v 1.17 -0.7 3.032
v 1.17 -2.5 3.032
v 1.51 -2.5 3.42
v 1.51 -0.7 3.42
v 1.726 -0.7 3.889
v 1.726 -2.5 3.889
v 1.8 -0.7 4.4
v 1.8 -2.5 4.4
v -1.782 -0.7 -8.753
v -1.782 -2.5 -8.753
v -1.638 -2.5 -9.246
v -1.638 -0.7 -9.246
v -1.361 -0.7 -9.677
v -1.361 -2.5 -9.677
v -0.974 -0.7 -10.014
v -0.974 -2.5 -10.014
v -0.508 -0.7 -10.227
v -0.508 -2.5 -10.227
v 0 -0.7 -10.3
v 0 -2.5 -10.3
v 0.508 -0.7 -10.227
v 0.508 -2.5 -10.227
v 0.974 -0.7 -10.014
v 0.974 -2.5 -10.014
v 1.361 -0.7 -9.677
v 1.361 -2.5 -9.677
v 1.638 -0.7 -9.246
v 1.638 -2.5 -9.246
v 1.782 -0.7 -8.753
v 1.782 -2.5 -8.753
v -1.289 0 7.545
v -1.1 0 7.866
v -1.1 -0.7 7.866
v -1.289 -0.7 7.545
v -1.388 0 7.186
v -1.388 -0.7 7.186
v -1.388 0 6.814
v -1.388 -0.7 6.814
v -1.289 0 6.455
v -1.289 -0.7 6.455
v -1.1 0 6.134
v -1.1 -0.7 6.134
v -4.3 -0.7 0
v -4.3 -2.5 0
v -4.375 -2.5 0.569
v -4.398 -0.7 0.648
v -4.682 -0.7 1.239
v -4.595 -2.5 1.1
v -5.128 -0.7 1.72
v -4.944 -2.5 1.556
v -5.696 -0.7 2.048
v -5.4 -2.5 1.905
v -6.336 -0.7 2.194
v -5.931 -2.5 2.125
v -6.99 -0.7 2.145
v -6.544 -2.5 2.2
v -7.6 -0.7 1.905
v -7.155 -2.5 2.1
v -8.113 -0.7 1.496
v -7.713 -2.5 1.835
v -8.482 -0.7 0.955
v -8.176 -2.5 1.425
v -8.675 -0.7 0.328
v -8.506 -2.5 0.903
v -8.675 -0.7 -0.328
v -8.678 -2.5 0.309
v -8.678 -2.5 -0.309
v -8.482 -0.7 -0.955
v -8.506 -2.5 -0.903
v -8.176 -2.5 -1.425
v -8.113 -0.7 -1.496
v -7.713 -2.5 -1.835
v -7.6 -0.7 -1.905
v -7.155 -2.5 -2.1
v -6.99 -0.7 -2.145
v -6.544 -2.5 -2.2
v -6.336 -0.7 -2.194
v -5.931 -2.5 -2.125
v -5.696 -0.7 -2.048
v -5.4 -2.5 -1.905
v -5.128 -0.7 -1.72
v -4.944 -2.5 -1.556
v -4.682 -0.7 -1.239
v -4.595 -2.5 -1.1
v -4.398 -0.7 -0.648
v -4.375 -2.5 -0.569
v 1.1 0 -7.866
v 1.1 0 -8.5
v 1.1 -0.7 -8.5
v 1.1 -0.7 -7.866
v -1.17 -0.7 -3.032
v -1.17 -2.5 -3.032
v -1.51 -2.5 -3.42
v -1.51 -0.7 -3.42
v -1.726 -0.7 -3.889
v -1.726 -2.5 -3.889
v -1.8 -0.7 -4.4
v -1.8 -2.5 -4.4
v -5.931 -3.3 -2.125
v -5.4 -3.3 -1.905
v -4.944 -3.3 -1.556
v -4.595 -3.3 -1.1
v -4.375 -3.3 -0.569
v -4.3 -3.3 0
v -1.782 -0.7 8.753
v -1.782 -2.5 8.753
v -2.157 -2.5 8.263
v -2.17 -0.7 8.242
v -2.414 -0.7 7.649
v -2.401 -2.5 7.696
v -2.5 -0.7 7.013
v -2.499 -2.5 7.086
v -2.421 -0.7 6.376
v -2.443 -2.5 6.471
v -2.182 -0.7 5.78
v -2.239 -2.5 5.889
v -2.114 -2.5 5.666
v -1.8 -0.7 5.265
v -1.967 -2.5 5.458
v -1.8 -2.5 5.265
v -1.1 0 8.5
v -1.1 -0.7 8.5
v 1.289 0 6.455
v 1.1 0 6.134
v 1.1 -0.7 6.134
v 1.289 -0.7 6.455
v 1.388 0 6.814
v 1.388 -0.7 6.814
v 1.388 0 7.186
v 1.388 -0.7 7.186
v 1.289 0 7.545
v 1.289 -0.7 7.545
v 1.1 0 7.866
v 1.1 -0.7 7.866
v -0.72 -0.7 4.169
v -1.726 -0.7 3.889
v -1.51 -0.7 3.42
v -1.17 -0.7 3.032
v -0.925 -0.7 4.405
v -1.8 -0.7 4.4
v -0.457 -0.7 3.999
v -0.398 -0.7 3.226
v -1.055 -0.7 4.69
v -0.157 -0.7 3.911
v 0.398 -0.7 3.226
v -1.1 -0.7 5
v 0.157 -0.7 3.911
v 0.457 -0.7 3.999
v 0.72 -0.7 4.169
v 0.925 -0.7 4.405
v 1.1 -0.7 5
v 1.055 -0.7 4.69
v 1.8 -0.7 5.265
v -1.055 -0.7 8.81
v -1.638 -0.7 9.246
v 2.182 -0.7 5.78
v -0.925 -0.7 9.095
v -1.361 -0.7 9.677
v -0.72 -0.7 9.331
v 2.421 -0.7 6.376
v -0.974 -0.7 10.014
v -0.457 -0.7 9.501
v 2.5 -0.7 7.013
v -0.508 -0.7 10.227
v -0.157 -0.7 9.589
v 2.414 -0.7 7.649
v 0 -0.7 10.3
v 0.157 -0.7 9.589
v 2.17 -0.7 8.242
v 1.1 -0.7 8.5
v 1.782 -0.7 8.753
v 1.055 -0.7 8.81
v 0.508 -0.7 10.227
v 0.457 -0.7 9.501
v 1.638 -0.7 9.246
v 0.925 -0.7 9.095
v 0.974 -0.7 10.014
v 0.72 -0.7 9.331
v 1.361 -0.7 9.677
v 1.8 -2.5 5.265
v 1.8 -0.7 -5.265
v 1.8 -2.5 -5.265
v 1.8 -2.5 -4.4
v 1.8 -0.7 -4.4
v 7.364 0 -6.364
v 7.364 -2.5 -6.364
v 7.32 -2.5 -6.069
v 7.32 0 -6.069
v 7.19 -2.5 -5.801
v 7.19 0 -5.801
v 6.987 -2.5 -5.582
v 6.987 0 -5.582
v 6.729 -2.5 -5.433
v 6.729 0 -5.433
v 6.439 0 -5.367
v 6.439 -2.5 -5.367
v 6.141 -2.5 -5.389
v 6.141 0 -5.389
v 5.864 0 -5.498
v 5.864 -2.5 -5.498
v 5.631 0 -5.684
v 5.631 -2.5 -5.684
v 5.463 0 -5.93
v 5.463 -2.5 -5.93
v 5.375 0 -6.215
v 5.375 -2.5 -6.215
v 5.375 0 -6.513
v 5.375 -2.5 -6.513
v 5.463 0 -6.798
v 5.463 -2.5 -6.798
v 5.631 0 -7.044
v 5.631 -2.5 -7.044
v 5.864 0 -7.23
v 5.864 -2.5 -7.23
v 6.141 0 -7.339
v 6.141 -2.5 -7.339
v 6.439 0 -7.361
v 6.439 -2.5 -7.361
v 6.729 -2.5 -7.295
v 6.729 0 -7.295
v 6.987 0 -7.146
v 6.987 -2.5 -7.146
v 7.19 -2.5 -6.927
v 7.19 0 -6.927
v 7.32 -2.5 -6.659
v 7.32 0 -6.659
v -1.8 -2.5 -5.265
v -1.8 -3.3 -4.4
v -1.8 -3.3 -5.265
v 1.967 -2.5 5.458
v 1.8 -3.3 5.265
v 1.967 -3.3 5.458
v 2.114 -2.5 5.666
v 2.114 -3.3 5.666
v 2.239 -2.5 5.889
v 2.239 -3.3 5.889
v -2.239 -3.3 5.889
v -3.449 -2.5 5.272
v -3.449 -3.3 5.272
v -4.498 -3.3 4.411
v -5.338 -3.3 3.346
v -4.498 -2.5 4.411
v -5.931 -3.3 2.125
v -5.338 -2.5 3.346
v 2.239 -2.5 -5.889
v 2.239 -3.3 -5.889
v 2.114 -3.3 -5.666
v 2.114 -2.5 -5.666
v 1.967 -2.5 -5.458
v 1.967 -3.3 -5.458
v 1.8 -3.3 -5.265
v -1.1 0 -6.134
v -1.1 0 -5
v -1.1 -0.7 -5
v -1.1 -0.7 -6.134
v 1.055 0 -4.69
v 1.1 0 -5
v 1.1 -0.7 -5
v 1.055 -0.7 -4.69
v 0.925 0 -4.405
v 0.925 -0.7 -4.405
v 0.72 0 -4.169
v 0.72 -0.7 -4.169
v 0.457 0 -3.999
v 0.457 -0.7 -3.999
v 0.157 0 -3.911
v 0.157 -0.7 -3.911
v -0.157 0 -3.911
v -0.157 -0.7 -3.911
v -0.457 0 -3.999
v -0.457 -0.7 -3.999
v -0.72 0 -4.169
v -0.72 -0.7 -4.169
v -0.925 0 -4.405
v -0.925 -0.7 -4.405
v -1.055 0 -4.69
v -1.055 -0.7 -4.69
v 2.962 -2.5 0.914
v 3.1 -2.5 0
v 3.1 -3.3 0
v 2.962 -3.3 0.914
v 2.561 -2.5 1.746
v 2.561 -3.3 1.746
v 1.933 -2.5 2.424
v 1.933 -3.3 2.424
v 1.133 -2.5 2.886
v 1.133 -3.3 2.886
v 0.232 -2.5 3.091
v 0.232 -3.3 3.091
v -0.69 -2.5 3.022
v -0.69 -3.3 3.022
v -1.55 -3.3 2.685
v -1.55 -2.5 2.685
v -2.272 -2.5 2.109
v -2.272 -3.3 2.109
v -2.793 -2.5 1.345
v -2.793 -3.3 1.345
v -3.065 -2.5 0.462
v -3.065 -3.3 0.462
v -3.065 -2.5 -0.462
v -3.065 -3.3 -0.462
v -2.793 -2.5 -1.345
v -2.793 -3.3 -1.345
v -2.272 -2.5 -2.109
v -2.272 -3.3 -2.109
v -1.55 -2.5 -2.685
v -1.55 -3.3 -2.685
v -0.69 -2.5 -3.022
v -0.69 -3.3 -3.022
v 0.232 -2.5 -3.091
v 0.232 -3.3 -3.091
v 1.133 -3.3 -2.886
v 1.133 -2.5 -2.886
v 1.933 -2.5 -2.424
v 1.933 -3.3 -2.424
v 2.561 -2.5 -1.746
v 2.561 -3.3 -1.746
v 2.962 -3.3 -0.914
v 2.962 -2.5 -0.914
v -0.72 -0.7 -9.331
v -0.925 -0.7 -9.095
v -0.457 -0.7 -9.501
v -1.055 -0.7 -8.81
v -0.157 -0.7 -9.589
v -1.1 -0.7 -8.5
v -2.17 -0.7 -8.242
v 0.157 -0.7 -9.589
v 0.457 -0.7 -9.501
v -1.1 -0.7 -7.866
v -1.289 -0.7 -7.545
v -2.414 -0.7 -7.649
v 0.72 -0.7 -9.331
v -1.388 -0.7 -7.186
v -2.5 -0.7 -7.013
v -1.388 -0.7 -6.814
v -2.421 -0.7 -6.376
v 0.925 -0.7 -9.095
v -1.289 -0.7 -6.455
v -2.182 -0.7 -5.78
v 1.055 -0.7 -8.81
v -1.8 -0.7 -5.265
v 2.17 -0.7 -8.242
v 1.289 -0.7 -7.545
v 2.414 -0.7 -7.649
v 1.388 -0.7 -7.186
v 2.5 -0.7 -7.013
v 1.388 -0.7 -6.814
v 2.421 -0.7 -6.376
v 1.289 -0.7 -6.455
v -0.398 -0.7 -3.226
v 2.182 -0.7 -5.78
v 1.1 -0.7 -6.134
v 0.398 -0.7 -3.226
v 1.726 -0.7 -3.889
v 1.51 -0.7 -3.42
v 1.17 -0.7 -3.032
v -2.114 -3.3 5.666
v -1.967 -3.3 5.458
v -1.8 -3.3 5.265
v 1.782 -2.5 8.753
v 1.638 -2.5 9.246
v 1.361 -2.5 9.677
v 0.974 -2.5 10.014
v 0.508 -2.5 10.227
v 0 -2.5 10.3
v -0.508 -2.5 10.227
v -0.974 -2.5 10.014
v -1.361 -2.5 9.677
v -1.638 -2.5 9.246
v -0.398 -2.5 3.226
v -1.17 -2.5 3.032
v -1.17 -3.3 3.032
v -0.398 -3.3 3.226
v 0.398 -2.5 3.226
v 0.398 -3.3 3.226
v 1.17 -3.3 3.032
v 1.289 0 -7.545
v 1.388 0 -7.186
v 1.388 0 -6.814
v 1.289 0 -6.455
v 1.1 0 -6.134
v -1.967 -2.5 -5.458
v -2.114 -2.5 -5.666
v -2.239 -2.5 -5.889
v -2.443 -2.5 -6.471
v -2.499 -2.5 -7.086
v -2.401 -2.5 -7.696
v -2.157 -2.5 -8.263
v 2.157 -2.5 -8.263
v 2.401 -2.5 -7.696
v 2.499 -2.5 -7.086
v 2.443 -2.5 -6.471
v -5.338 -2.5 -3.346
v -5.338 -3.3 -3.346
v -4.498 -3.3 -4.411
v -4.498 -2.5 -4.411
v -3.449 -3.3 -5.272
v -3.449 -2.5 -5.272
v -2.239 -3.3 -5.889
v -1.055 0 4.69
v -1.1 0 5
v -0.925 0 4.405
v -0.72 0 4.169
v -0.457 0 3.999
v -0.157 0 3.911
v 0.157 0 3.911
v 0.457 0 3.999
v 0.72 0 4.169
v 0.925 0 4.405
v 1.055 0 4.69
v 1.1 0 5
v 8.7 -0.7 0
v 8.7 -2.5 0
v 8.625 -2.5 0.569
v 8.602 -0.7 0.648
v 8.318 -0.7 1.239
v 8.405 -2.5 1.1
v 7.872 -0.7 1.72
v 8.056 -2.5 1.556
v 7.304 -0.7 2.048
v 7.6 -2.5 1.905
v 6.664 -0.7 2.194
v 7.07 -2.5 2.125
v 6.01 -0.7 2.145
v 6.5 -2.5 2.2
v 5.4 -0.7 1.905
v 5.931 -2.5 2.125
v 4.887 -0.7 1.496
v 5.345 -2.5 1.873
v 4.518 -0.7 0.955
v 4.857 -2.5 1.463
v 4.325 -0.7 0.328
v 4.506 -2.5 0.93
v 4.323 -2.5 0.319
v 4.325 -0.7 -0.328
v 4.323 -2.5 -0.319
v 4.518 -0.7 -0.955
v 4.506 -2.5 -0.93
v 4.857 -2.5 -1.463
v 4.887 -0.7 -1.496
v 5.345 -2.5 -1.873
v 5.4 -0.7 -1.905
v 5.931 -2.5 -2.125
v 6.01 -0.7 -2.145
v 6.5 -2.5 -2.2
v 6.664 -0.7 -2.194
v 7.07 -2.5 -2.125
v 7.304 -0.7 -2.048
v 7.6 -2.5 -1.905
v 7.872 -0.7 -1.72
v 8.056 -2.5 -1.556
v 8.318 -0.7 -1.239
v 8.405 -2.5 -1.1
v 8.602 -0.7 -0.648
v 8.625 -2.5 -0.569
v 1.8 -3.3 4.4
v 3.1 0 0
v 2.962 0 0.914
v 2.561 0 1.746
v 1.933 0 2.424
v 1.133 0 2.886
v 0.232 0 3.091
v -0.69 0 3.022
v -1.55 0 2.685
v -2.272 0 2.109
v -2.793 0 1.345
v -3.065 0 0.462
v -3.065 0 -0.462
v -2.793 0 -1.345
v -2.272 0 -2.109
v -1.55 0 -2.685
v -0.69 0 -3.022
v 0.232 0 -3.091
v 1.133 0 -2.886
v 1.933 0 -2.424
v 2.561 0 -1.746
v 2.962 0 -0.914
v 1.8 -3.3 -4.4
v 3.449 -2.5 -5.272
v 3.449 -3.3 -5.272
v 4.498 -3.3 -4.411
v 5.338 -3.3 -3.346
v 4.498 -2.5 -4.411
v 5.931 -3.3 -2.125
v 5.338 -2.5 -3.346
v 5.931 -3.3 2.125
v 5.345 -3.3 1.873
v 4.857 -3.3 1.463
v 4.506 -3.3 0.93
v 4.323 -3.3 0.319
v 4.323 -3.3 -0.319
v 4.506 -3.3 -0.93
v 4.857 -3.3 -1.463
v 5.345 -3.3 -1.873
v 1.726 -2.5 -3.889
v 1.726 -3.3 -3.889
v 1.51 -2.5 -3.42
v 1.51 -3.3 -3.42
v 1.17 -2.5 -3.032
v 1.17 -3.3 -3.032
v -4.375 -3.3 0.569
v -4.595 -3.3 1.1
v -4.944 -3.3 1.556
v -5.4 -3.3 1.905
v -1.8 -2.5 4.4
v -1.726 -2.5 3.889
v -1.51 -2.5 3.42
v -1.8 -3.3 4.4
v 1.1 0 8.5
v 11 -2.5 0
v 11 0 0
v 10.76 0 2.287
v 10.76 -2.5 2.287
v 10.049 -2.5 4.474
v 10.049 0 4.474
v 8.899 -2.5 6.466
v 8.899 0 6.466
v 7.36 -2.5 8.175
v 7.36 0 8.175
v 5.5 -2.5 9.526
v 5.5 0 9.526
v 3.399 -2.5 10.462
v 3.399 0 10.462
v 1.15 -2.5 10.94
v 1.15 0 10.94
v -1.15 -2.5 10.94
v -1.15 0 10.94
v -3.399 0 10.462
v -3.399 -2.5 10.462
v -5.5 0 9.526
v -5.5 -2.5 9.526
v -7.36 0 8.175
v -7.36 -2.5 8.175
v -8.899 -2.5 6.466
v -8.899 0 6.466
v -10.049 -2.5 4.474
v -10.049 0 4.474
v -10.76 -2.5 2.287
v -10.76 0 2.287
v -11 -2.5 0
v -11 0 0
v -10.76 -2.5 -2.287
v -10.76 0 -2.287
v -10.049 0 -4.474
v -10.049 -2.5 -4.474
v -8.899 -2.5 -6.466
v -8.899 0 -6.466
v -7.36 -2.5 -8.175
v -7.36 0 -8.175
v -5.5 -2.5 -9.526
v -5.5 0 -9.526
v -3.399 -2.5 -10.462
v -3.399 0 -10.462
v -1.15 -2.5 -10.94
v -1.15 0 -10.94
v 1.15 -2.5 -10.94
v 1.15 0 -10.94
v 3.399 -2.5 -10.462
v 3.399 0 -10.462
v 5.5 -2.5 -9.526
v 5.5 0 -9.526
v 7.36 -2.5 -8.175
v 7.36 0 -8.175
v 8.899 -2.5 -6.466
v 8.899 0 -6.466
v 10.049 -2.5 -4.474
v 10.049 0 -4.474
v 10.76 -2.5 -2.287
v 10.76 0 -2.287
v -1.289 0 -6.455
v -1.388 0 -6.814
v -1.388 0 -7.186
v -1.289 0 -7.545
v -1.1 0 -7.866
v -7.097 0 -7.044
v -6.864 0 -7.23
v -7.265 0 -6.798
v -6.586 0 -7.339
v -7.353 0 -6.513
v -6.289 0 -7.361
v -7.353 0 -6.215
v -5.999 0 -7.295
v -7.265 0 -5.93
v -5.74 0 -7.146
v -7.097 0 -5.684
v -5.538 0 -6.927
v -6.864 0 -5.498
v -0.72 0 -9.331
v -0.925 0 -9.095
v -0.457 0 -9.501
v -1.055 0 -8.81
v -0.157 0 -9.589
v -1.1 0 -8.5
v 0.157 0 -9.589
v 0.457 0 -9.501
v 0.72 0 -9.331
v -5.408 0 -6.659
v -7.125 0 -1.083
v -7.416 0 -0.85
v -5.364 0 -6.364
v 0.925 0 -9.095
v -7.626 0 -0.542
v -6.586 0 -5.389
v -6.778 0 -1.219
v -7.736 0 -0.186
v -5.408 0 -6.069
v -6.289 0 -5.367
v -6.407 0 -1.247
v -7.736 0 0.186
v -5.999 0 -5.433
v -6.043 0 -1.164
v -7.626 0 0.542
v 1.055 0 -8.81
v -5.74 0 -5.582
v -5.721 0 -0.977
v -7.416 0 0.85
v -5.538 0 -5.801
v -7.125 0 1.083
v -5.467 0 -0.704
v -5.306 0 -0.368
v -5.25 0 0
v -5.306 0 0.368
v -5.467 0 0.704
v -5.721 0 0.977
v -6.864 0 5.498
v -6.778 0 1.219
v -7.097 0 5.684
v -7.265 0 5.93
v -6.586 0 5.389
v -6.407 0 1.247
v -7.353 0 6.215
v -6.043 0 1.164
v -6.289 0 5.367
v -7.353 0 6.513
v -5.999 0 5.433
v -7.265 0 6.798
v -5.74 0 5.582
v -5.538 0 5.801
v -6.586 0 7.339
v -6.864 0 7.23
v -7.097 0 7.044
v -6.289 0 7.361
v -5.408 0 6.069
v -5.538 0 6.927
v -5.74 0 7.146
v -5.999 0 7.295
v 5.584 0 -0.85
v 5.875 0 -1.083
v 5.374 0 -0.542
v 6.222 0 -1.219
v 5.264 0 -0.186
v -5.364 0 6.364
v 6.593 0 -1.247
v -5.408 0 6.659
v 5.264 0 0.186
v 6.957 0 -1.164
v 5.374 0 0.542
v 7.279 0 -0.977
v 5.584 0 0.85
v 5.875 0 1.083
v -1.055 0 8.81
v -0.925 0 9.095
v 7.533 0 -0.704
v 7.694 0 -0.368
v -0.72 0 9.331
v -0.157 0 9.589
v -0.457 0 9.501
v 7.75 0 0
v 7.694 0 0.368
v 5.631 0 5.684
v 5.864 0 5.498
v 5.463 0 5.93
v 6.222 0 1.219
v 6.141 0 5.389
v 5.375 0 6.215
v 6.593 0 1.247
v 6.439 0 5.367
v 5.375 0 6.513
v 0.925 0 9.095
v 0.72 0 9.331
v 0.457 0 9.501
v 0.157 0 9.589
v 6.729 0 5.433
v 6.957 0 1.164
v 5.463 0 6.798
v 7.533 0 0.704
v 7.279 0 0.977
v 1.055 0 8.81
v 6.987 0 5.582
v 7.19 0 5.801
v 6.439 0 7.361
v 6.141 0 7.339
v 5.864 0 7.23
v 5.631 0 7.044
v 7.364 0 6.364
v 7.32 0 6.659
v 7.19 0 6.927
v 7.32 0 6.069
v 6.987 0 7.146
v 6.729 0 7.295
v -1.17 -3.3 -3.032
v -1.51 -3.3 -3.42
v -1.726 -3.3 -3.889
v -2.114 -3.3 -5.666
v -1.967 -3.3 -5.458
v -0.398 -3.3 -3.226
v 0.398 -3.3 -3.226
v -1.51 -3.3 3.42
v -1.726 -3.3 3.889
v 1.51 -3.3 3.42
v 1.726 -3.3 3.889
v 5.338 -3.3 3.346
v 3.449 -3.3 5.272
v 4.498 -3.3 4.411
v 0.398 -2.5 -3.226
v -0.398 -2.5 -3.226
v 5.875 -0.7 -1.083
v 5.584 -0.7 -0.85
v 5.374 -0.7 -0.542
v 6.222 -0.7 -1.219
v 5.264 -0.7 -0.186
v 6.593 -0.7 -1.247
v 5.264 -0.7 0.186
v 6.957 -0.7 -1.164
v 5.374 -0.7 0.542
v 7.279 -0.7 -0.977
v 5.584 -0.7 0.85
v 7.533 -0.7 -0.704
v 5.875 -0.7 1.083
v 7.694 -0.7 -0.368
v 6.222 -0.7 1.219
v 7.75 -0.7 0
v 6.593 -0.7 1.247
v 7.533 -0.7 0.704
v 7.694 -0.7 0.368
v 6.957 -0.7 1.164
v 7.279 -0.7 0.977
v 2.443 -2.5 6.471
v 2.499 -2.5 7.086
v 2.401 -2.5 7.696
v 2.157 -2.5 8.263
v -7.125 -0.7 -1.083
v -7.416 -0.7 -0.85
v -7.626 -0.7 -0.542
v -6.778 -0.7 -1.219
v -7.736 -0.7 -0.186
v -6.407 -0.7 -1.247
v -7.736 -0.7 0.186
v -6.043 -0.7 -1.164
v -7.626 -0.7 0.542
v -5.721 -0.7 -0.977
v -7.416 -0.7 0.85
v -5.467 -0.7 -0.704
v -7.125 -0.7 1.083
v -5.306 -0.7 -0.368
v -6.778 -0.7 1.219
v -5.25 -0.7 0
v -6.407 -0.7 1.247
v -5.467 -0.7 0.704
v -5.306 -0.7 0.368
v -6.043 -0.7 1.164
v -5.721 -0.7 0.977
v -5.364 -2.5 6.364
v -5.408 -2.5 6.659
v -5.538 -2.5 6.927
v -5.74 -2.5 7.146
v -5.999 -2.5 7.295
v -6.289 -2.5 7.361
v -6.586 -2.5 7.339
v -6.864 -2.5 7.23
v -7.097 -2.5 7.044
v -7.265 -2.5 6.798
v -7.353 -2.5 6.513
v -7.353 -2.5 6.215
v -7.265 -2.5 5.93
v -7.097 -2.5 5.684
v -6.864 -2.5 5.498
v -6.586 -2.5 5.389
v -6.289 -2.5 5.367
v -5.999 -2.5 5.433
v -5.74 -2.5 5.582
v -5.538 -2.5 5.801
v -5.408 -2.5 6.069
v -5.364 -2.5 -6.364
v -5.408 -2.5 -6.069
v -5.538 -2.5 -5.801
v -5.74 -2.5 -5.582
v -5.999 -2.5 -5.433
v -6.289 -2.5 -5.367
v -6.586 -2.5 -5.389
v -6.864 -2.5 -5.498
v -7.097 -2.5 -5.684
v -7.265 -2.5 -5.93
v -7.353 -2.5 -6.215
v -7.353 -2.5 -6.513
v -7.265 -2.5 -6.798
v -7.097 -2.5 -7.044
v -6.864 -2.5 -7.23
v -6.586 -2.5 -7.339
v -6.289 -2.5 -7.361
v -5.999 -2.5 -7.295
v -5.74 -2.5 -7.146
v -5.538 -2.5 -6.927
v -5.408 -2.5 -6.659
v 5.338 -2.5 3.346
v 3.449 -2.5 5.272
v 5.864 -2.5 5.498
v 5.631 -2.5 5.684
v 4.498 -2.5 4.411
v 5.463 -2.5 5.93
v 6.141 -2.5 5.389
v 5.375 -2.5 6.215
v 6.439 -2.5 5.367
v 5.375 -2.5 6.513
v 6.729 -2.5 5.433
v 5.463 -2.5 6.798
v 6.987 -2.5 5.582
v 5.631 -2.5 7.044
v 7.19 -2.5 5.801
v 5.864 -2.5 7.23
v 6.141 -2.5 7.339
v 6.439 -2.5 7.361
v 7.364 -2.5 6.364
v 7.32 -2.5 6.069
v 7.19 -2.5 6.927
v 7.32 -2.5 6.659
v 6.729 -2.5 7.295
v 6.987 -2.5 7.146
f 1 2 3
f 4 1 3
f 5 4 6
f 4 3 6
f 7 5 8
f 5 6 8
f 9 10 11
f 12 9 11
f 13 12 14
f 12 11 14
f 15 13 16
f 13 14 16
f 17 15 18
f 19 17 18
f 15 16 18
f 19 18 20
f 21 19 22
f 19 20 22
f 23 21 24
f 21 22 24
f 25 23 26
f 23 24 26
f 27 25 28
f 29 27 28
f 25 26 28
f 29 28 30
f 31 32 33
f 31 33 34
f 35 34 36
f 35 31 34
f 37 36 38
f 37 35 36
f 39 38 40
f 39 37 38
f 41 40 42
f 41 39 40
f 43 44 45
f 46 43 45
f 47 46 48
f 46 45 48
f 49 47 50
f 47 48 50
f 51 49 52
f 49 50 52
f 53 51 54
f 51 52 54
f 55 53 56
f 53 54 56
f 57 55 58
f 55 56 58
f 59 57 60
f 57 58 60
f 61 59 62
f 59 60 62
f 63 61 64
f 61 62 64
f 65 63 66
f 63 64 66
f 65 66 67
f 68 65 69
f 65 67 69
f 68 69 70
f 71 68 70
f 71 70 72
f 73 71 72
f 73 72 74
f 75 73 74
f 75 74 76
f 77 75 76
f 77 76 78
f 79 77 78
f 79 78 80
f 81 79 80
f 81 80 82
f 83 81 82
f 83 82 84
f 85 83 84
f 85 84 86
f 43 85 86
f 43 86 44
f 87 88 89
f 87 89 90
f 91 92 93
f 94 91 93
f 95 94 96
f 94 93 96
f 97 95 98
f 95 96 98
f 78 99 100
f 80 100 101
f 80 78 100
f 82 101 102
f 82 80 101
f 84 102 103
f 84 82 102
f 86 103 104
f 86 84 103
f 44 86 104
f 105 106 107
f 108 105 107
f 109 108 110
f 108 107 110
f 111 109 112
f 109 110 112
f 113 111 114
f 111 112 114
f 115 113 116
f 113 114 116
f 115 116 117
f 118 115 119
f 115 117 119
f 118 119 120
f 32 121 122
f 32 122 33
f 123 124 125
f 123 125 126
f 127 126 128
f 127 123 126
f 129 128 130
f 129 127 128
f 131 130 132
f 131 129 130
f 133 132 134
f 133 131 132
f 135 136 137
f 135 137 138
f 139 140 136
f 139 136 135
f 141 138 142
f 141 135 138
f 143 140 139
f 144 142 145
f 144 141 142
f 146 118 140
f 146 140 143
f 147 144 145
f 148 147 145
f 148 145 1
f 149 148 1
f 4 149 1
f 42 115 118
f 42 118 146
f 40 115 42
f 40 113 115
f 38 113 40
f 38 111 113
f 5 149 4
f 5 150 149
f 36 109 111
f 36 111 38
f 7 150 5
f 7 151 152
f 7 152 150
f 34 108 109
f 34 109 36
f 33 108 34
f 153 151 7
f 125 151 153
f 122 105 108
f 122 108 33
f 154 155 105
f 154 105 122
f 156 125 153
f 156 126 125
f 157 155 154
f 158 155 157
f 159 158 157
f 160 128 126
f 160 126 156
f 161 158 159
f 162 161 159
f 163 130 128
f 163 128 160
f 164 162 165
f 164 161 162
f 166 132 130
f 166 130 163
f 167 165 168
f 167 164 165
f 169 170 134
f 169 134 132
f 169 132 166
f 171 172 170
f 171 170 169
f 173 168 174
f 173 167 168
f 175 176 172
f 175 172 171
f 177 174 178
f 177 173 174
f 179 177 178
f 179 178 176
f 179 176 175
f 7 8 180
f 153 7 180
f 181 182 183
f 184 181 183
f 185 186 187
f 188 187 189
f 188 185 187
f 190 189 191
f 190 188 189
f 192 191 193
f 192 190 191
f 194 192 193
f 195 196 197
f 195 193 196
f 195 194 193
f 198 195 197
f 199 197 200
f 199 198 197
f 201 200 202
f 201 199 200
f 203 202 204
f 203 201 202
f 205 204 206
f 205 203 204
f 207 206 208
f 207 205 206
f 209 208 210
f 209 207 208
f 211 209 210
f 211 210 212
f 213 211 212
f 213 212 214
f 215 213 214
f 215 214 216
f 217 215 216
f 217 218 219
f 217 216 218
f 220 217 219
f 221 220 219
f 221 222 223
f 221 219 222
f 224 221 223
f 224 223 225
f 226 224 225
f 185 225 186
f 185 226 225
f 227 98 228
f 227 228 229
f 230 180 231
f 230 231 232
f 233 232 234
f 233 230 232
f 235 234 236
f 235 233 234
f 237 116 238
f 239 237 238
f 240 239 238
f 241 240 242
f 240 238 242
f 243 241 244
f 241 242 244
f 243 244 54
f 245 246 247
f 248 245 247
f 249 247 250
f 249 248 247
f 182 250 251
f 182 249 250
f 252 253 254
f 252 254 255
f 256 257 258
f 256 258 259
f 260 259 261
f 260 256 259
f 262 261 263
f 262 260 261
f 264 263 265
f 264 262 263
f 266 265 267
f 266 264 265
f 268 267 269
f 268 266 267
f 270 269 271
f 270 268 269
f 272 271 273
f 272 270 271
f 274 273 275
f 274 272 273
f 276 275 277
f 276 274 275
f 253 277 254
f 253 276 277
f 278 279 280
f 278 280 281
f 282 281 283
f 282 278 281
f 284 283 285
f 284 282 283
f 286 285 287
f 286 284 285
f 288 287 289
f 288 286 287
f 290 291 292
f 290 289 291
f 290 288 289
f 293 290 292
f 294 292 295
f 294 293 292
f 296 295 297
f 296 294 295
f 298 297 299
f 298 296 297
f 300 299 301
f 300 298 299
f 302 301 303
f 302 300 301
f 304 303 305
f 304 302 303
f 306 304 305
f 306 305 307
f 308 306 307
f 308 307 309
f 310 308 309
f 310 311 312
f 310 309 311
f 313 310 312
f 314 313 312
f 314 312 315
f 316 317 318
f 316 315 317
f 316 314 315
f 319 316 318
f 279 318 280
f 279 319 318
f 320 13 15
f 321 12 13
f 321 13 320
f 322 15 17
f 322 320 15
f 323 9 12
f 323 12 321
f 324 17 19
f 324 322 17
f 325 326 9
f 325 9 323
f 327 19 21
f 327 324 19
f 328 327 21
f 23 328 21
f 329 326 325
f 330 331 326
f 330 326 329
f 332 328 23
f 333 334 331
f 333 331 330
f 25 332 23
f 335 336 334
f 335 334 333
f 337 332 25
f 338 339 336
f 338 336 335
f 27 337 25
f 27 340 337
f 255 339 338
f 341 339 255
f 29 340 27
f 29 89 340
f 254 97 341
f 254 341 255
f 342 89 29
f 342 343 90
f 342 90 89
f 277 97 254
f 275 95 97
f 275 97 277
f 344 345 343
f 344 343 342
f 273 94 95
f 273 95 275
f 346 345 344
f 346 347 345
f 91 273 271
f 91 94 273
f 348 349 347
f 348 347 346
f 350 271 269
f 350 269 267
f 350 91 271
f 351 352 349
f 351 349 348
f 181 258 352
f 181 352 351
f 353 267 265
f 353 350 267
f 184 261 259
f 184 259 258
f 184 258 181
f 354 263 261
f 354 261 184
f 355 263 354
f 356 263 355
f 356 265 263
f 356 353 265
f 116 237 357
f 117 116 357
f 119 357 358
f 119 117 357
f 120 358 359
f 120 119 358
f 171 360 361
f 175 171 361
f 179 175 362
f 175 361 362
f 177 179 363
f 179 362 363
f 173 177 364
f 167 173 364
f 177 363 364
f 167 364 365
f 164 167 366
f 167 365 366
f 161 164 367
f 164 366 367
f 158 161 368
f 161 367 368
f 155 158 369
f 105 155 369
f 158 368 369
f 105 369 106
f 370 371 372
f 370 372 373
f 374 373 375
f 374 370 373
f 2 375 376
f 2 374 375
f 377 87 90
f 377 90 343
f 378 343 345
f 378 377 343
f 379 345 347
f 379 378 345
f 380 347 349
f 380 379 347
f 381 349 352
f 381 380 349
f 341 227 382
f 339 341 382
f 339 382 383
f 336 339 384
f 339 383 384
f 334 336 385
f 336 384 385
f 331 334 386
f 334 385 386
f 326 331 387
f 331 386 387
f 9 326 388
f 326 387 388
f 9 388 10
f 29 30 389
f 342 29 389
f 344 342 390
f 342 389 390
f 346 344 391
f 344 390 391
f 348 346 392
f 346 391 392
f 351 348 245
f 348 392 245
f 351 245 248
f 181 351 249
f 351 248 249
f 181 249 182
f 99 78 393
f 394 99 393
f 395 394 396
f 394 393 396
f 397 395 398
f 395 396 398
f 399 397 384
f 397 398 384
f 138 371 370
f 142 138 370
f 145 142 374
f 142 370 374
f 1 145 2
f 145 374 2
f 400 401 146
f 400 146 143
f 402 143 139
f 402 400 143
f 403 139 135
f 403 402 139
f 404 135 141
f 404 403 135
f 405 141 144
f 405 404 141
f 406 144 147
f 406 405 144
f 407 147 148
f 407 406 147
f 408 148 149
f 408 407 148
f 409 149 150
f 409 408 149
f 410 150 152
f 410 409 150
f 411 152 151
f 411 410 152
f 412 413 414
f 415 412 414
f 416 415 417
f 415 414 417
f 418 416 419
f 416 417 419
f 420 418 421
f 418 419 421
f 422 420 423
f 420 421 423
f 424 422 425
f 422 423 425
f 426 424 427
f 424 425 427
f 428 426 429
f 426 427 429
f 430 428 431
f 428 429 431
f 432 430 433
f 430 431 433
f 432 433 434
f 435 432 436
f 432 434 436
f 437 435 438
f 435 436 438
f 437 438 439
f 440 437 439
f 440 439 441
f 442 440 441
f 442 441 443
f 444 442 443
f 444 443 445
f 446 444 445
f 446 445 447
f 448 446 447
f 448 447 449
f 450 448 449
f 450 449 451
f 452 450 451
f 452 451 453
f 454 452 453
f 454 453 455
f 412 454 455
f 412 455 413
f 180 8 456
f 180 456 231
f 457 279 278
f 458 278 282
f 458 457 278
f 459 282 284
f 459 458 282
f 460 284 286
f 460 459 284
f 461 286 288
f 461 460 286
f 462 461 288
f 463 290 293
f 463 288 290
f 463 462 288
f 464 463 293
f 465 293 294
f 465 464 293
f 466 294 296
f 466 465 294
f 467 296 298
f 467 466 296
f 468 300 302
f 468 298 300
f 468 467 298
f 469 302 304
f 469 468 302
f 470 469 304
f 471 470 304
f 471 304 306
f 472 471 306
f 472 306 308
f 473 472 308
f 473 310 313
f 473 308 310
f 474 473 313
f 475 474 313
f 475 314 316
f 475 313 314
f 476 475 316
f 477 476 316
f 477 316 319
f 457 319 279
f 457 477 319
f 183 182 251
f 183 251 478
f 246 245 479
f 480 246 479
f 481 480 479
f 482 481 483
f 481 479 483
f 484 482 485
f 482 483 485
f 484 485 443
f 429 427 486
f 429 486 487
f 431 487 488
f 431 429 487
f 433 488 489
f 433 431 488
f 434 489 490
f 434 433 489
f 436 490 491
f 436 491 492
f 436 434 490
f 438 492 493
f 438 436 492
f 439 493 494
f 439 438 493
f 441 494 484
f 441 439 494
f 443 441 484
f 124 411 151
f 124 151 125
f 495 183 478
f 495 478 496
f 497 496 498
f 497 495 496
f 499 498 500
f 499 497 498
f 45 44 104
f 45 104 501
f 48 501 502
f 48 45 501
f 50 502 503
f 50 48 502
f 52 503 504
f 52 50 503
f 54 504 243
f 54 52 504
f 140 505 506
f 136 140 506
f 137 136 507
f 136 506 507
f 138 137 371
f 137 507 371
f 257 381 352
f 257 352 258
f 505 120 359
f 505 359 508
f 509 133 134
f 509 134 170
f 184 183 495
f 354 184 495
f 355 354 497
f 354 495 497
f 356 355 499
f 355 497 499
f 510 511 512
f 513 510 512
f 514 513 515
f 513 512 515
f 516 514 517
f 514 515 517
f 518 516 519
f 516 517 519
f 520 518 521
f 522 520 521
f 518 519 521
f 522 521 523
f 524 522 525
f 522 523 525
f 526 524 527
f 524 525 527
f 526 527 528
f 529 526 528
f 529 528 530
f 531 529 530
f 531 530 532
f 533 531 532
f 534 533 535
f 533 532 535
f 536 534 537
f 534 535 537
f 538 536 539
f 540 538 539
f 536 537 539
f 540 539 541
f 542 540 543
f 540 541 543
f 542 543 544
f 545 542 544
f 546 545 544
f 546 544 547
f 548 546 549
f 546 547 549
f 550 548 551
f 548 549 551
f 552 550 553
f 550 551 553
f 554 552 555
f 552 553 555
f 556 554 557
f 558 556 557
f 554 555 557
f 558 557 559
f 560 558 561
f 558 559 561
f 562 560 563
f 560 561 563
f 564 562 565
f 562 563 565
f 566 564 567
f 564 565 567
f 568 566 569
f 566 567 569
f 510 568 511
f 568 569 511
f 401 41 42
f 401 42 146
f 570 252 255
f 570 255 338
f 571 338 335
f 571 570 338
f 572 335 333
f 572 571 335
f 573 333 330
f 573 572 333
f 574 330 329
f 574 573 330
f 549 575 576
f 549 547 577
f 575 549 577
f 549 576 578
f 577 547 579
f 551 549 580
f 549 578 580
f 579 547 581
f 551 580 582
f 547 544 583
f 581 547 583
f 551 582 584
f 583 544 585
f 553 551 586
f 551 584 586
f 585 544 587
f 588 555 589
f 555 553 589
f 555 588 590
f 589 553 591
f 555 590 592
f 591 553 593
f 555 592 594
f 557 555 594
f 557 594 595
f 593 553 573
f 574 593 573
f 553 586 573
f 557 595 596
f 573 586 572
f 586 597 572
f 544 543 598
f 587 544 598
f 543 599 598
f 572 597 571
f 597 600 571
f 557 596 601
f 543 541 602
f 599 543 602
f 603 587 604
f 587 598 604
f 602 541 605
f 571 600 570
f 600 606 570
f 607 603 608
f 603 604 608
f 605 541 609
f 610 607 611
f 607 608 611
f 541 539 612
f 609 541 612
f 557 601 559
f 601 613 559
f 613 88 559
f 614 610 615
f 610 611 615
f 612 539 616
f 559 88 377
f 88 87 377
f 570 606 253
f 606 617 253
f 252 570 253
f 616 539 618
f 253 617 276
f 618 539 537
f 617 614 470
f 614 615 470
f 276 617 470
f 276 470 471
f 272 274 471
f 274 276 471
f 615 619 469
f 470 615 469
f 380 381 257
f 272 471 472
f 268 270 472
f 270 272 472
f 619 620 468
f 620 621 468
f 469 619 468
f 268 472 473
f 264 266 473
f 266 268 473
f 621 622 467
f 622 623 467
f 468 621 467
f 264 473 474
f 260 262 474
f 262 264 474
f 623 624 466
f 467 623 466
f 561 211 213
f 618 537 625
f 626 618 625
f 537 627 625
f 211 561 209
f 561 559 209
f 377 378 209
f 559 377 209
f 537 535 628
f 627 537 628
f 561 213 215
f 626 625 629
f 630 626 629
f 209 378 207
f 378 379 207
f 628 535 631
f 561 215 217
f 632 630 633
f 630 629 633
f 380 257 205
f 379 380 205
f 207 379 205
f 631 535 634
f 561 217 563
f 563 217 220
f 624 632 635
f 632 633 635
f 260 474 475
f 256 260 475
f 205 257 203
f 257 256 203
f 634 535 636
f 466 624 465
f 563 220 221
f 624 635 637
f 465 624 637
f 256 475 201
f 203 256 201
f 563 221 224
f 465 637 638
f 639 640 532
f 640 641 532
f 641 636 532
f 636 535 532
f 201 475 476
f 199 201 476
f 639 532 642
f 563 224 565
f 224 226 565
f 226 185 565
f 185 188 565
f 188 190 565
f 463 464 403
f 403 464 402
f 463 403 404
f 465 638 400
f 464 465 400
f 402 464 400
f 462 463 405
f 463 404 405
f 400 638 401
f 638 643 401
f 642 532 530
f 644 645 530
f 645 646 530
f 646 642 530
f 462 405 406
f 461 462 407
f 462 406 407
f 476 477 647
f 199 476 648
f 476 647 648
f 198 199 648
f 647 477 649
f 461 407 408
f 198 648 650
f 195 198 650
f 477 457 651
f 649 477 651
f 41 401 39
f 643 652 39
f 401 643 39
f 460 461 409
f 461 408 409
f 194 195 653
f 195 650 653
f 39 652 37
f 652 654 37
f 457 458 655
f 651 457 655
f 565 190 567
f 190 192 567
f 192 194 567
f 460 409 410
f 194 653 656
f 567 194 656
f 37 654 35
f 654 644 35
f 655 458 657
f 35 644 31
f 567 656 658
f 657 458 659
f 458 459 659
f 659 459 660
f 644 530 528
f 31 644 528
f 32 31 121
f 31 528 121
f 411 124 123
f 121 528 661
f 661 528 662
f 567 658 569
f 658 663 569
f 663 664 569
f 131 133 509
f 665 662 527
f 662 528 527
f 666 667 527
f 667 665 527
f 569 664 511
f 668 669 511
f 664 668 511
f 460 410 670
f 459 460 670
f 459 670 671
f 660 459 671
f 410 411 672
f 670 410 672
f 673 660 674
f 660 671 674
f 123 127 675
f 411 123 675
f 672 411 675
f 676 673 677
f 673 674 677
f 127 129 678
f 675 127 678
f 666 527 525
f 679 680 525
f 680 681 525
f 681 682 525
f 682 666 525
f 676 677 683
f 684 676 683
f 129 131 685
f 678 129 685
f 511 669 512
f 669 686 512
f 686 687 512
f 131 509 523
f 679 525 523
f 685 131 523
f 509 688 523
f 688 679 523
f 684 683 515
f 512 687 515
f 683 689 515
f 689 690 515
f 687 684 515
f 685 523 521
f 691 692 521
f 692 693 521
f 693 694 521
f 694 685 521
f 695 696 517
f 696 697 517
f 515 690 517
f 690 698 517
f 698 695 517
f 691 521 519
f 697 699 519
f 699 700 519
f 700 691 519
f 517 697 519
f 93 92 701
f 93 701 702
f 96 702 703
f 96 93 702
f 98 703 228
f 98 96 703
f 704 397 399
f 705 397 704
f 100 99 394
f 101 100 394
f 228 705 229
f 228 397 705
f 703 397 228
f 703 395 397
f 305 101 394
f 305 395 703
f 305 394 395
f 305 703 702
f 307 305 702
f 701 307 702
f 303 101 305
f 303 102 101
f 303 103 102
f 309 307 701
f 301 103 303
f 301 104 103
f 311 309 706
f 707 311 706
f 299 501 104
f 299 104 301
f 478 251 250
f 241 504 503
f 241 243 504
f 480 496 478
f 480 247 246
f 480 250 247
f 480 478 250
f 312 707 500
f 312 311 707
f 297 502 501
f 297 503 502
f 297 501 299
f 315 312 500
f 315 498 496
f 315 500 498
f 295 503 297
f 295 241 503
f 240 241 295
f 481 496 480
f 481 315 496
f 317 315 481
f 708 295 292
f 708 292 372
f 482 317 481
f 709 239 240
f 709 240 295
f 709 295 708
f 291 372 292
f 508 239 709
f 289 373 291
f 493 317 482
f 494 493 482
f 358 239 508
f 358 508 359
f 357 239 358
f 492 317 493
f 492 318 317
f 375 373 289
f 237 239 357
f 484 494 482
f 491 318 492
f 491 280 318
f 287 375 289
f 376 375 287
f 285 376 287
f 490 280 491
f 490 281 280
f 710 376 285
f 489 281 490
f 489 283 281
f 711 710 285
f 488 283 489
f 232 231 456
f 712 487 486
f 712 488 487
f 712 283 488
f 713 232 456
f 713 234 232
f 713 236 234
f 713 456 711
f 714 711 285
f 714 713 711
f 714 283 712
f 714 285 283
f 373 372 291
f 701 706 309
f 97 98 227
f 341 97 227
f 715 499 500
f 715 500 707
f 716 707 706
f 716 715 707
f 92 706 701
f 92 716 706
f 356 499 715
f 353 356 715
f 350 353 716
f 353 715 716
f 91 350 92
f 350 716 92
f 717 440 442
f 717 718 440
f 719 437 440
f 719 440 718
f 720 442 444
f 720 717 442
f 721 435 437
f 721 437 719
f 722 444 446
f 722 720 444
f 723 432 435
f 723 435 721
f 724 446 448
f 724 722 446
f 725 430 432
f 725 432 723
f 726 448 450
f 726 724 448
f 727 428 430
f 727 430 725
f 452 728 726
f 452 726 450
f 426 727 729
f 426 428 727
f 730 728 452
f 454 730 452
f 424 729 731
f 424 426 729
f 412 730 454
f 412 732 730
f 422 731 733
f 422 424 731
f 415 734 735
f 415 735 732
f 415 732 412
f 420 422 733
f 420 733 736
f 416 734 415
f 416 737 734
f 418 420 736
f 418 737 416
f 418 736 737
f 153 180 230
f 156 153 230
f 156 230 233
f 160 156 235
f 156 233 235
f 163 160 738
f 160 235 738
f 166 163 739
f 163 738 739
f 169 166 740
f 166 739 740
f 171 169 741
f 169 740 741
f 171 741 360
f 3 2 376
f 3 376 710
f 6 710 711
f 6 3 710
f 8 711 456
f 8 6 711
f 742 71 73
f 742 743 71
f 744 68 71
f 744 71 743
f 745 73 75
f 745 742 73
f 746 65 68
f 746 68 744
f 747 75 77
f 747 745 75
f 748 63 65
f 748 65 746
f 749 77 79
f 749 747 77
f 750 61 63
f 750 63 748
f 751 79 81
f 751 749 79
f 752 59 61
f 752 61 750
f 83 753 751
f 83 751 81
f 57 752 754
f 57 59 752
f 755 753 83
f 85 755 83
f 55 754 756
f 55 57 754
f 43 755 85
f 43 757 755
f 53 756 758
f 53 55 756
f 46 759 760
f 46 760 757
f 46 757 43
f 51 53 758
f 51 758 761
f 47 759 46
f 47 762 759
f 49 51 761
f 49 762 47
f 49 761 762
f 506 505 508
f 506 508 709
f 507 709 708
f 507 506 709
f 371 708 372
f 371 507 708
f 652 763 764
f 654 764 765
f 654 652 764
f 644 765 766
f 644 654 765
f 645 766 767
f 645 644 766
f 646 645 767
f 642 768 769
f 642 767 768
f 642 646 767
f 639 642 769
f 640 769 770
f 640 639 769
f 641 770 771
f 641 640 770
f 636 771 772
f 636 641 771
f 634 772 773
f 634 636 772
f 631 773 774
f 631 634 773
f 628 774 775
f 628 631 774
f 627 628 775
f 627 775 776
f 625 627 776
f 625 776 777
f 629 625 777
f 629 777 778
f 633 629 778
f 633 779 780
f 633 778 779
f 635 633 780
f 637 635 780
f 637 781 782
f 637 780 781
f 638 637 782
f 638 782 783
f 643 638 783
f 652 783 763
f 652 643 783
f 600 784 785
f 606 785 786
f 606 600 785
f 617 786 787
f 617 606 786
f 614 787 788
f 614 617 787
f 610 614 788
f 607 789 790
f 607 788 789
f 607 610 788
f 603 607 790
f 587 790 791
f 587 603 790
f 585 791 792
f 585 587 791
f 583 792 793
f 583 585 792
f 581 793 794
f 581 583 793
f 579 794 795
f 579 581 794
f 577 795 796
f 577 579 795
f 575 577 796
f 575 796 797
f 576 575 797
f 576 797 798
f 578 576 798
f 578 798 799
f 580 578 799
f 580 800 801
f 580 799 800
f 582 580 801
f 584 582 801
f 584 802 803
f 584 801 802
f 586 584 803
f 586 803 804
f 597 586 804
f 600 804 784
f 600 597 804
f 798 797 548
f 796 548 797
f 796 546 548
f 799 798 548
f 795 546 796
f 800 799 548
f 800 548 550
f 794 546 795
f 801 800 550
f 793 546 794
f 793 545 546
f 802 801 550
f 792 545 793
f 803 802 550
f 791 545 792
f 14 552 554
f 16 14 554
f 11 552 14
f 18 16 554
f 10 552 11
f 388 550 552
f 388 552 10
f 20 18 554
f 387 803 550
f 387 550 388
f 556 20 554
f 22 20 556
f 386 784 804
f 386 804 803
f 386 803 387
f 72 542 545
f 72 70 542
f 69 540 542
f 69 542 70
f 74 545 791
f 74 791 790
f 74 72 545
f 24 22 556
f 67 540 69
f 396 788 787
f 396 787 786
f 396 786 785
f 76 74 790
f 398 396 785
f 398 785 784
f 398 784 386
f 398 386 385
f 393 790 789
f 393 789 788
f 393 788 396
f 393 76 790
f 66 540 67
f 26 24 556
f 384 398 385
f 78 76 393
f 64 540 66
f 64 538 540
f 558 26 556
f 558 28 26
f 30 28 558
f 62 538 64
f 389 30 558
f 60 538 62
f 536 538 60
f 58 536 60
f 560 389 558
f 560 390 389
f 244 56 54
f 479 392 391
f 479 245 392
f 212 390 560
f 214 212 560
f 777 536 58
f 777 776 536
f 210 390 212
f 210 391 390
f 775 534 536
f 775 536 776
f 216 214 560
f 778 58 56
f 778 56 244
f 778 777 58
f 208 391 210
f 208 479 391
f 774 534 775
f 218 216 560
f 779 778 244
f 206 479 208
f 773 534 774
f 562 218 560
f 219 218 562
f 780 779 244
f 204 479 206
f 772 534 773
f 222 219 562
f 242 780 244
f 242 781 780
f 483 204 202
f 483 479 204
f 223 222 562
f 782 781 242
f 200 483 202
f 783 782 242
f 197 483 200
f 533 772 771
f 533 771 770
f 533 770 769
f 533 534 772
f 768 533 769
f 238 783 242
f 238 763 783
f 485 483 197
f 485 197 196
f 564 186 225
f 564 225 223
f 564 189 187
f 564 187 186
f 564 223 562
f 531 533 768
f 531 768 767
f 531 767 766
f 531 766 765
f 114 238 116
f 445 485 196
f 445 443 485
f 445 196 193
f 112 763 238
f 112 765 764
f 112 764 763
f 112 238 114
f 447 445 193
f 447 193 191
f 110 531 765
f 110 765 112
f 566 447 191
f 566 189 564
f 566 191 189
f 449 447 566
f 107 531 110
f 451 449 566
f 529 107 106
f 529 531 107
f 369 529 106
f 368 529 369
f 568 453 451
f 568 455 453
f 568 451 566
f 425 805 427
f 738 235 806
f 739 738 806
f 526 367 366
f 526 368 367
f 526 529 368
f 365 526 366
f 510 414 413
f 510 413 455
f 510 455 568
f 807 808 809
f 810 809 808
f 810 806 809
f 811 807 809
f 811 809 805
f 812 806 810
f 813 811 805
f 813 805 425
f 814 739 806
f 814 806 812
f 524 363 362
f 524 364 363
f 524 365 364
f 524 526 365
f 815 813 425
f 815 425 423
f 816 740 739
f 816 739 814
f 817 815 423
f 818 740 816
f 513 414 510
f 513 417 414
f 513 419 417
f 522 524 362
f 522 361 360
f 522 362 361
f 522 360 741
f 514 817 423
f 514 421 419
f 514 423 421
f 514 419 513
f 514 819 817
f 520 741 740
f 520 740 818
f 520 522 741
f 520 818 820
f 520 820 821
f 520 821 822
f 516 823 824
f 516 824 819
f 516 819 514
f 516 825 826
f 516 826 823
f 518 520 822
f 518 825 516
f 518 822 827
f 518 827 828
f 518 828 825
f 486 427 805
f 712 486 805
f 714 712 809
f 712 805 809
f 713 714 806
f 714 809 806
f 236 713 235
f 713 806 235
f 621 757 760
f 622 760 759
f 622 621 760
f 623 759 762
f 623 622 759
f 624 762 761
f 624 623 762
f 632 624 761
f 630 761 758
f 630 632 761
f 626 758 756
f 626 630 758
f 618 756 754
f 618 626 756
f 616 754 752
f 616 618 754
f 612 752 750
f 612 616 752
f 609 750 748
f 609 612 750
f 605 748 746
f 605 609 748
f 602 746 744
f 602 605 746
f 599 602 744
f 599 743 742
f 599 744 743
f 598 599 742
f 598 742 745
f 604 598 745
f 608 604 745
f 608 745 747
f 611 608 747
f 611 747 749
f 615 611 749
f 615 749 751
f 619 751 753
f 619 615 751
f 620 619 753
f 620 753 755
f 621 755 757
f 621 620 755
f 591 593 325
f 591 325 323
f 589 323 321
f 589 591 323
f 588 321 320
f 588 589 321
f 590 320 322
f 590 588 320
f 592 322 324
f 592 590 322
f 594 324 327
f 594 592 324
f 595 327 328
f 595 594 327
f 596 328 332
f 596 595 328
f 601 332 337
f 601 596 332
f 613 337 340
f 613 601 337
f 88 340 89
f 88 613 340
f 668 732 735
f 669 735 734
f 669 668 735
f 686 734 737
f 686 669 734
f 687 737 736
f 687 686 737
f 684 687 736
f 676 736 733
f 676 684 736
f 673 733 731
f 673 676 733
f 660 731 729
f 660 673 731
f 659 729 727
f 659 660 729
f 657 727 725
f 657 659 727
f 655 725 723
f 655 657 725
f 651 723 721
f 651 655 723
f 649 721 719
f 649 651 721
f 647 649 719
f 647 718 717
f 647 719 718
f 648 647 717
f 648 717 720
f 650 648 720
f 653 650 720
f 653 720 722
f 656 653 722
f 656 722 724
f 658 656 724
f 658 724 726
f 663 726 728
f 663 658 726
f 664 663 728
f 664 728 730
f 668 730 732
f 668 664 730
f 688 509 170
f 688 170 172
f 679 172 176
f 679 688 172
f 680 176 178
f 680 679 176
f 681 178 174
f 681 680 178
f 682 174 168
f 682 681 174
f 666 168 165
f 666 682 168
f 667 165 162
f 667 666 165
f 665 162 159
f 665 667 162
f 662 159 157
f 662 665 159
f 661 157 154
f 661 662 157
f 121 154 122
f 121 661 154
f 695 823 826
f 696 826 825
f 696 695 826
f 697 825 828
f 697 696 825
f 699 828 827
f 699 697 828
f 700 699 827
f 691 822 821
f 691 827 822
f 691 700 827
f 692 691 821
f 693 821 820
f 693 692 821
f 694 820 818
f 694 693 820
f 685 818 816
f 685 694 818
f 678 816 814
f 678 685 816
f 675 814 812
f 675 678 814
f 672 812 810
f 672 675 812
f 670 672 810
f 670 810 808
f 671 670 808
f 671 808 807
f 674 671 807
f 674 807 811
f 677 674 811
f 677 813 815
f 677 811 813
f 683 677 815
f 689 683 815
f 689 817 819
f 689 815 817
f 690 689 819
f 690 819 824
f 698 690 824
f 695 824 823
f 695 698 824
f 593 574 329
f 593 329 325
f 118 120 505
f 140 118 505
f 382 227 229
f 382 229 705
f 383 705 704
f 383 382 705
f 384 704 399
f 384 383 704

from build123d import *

# Parameters (mm, degrees)
F0_R     = 11
F2_DEPTH = 2.5
F1_R     = 3.1
F1_R_2   = 1.25
F1_R_3   = 1
F3_DEPTH = 2.501
F4_R     = 2.2
F5_DEPTH = 1.8
F6_R     = 6.3
F7_DEPTH = 0.8
F8_DEPTH = 0.8
F9_DEPTH = 3.301


with BuildPart() as f2:
    # F0 (on Front) → F2 (new body)
    with BuildSketch(Plane.XZ):
        Circle(F0_R)
    extrude(amount=F2_DEPTH)

    # F1 (on Front) → F3 (cut, through all)
    with BuildSketch(Plane.XZ):
        Circle(F1_R)
        with Locations((-6.5, 0)):
            Circle(F1_R_2)
        with Locations((-6.363961, 6.363961)):
            Circle(F1_R_3)
        with Locations((-6.363961, -6.363961)):
            Circle(F1_R_3)
        with Locations((6.363961, -6.363961)):
            Circle(F1_R_3)
        with Locations((6.363961, 6.363961)):
            Circle(F1_R_3)
        with Locations((6.5, 0)):
            Circle(F1_R_2)
        with BuildLine():
            ThreePointArc((1.1, -5), (0, -3.9), (-1.1, -5))
            Line((-1.1, -5), (-1.1, -6.133975))
            ThreePointArc((-1.1, -6.133975), (-1.4, -7), (-1.1, -7.866025))
            Line((-1.1, -7.866025), (-1.1, -8.5))
            ThreePointArc((-1.1, -8.5), (0, -9.6), (1.1, -8.5))
            Line((1.1, -8.5), (1.1, -7.866025))
            ThreePointArc((1.1, -7.866025), (1.4, -7), (1.1, -6.133975))
            Line((1.1, -6.133975), (1.1, -5))
        make_face()
        with BuildLine():
            Line((-1.1, 8.5), (-1.1, 7.866025))
            ThreePointArc((-1.1, 7.866025), (-1.4, 7), (-1.1, 6.133975))
            Line((-1.1, 6.133975), (-1.1, 5))
            ThreePointArc((-1.1, 5), (0, 3.9), (1.1, 5))
            Line((1.1, 5), (1.1, 6.133975))
            ThreePointArc((1.1, 6.133975), (1.4, 7), (1.1, 7.866025))
            Line((1.1, 7.866025), (1.1, 8.5))
            ThreePointArc((1.1, 8.5), (0, 9.6), (-1.1, 8.5))
        make_face()
    extrude(amount=F3_DEPTH, mode=Mode.SUBTRACT)

    # F4 (on face) → F5 (cut)
    with BuildSketch(Plane.XZ.offset(2.5)):
        with Locations((-6.5, 0)):
            Circle(F4_R)
        with Locations((6.5, 0)):
            Circle(F4_R)
        with BuildLine():
            Line((1.8, 4.4), (1.8, 5.265065))
            ThreePointArc((1.8, 5.265065), (2.499967, 7.01284), (1.782084, 8.753333))
            ThreePointArc((1.782084, 8.753333), (0, 10.3), (-1.782084, 8.753333))
            ThreePointArc((-1.782084, 8.753333), (-2.499967, 7.01284), (-1.8, 5.265065))
            Line((-1.8, 5.265065), (-1.8, 4.4))
            ThreePointArc((-1.8, 4.4), (-1.634926, 3.646995), (-1.169981, 3.032102))
            ThreePointArc((-1.169981, 3.032102), (0, 3.25), (1.169981, 3.032102))
            ThreePointArc((1.169981, 3.032102), (1.634926, 3.646995), (1.8, 4.4))
        make_face()
        with BuildLine():
            Line((-1.8, -4.4), (-1.8, -5.265065))
            ThreePointArc((-1.8, -5.265065), (-2.499967, -7.01284), (-1.782084, -8.753333))
            ThreePointArc((-1.782084, -8.753333), (0, -10.3), (1.782084, -8.753333))
            ThreePointArc((1.782084, -8.753333), (2.499967, -7.01284), (1.8, -5.265065))
            Line((1.8, -5.265065), (1.8, -4.4))
            ThreePointArc((1.8, -4.4), (1.634926, -3.646995), (1.169981, -3.032102))
            ThreePointArc((1.169981, -3.032102), (0, -3.25), (-1.169981, -3.032102))
            ThreePointArc((-1.169981, -3.032102), (-1.634926, -3.646995), (-1.8, -4.4))
        make_face()
    extrude(amount=-F5_DEPTH, mode=Mode.SUBTRACT)

    # F6 (on face) → F7 (join)
    with BuildSketch(Plane.XZ.offset(2.5)):
        Circle(F6_R)
    extrude(amount=F7_DEPTH)

    # F4 (on face) → F8 (cut)
    with BuildSketch(Plane.XZ.offset(2.5)):
        with Locations((-6.5, 0)):
            Circle(F4_R)
        with Locations((6.5, 0)):
            Circle(F4_R)
        with BuildLine():
            Line((1.8, 4.4), (1.8, 5.265065))
            ThreePointArc((1.8, 5.265065), (2.499967, 7.01284), (1.782084, 8.753333))
            ThreePointArc((1.782084, 8.753333), (0, 10.3), (-1.782084, 8.753333))
            ThreePointArc((-1.782084, 8.753333), (-2.499967, 7.01284), (-1.8, 5.265065))
            Line((-1.8, 5.265065), (-1.8, 4.4))
            ThreePointArc((-1.8, 4.4), (-1.634926, 3.646995), (-1.169981, 3.032102))
            ThreePointArc((-1.169981, 3.032102), (0, 3.25), (1.169981, 3.032102))
            ThreePointArc((1.169981, 3.032102), (1.634926, 3.646995), (1.8, 4.4))
        make_face()
        with BuildLine():
            Line((-1.8, -4.4), (-1.8, -5.265065))
            ThreePointArc((-1.8, -5.265065), (-2.499967, -7.01284), (-1.782084, -8.753333))
            ThreePointArc((-1.782084, -8.753333), (0, -10.3), (1.782084, -8.753333))
            ThreePointArc((1.782084, -8.753333), (2.499967, -7.01284), (1.8, -5.265065))
            Line((1.8, -5.265065), (1.8, -4.4))
            ThreePointArc((1.8, -4.4), (1.634926, -3.646995), (1.169981, -3.032102))
            ThreePointArc((1.169981, -3.032102), (0, -3.25), (-1.169981, -3.032102))
            ThreePointArc((-1.169981, -3.032102), (-1.634926, -3.646995), (-1.8, -4.4))
        make_face()
    extrude(amount=F8_DEPTH, mode=Mode.SUBTRACT)

    # F1 (on Front) → F9 (cut, through all)
    with BuildSketch(Plane.XZ):
        Circle(F1_R)
        with Locations((-6.5, 0)):
            Circle(F1_R_2)
        with Locations((-6.363961, 6.363961)):
            Circle(F1_R_3)
        with Locations((-6.363961, -6.363961)):
            Circle(F1_R_3)
        with Locations((6.363961, -6.363961)):
            Circle(F1_R_3)
        with Locations((6.363961, 6.363961)):
            Circle(F1_R_3)
        with Locations((6.5, 0)):
            Circle(F1_R_2)
        with BuildLine():
            ThreePointArc((1.1, -5), (0, -3.9), (-1.1, -5))
            Line((-1.1, -5), (-1.1, -6.133975))
            ThreePointArc((-1.1, -6.133975), (-1.4, -7), (-1.1, -7.866025))
            Line((-1.1, -7.866025), (-1.1, -8.5))
            ThreePointArc((-1.1, -8.5), (0, -9.6), (1.1, -8.5))
            Line((1.1, -8.5), (1.1, -7.866025))
            ThreePointArc((1.1, -7.866025), (1.4, -7), (1.1, -6.133975))
            Line((1.1, -6.133975), (1.1, -5))
        make_face()
        with BuildLine():
            Line((-1.1, 8.5), (-1.1, 7.866025))
            ThreePointArc((-1.1, 7.866025), (-1.4, 7), (-1.1, 6.133975))
            Line((-1.1, 6.133975), (-1.1, 5))
            ThreePointArc((-1.1, 5), (0, 3.9), (1.1, 5))
            Line((1.1, 5), (1.1, 6.133975))
            ThreePointArc((1.1, 6.133975), (1.4, 7), (1.1, 7.866025))
            Line((1.1, 7.866025), (1.1, 8.5))
            ThreePointArc((1.1, 8.5), (0, 9.6), (-1.1, 8.5))
        make_face()
    extrude(amount=F9_DEPTH, mode=Mode.SUBTRACT)


solid = f2.part
